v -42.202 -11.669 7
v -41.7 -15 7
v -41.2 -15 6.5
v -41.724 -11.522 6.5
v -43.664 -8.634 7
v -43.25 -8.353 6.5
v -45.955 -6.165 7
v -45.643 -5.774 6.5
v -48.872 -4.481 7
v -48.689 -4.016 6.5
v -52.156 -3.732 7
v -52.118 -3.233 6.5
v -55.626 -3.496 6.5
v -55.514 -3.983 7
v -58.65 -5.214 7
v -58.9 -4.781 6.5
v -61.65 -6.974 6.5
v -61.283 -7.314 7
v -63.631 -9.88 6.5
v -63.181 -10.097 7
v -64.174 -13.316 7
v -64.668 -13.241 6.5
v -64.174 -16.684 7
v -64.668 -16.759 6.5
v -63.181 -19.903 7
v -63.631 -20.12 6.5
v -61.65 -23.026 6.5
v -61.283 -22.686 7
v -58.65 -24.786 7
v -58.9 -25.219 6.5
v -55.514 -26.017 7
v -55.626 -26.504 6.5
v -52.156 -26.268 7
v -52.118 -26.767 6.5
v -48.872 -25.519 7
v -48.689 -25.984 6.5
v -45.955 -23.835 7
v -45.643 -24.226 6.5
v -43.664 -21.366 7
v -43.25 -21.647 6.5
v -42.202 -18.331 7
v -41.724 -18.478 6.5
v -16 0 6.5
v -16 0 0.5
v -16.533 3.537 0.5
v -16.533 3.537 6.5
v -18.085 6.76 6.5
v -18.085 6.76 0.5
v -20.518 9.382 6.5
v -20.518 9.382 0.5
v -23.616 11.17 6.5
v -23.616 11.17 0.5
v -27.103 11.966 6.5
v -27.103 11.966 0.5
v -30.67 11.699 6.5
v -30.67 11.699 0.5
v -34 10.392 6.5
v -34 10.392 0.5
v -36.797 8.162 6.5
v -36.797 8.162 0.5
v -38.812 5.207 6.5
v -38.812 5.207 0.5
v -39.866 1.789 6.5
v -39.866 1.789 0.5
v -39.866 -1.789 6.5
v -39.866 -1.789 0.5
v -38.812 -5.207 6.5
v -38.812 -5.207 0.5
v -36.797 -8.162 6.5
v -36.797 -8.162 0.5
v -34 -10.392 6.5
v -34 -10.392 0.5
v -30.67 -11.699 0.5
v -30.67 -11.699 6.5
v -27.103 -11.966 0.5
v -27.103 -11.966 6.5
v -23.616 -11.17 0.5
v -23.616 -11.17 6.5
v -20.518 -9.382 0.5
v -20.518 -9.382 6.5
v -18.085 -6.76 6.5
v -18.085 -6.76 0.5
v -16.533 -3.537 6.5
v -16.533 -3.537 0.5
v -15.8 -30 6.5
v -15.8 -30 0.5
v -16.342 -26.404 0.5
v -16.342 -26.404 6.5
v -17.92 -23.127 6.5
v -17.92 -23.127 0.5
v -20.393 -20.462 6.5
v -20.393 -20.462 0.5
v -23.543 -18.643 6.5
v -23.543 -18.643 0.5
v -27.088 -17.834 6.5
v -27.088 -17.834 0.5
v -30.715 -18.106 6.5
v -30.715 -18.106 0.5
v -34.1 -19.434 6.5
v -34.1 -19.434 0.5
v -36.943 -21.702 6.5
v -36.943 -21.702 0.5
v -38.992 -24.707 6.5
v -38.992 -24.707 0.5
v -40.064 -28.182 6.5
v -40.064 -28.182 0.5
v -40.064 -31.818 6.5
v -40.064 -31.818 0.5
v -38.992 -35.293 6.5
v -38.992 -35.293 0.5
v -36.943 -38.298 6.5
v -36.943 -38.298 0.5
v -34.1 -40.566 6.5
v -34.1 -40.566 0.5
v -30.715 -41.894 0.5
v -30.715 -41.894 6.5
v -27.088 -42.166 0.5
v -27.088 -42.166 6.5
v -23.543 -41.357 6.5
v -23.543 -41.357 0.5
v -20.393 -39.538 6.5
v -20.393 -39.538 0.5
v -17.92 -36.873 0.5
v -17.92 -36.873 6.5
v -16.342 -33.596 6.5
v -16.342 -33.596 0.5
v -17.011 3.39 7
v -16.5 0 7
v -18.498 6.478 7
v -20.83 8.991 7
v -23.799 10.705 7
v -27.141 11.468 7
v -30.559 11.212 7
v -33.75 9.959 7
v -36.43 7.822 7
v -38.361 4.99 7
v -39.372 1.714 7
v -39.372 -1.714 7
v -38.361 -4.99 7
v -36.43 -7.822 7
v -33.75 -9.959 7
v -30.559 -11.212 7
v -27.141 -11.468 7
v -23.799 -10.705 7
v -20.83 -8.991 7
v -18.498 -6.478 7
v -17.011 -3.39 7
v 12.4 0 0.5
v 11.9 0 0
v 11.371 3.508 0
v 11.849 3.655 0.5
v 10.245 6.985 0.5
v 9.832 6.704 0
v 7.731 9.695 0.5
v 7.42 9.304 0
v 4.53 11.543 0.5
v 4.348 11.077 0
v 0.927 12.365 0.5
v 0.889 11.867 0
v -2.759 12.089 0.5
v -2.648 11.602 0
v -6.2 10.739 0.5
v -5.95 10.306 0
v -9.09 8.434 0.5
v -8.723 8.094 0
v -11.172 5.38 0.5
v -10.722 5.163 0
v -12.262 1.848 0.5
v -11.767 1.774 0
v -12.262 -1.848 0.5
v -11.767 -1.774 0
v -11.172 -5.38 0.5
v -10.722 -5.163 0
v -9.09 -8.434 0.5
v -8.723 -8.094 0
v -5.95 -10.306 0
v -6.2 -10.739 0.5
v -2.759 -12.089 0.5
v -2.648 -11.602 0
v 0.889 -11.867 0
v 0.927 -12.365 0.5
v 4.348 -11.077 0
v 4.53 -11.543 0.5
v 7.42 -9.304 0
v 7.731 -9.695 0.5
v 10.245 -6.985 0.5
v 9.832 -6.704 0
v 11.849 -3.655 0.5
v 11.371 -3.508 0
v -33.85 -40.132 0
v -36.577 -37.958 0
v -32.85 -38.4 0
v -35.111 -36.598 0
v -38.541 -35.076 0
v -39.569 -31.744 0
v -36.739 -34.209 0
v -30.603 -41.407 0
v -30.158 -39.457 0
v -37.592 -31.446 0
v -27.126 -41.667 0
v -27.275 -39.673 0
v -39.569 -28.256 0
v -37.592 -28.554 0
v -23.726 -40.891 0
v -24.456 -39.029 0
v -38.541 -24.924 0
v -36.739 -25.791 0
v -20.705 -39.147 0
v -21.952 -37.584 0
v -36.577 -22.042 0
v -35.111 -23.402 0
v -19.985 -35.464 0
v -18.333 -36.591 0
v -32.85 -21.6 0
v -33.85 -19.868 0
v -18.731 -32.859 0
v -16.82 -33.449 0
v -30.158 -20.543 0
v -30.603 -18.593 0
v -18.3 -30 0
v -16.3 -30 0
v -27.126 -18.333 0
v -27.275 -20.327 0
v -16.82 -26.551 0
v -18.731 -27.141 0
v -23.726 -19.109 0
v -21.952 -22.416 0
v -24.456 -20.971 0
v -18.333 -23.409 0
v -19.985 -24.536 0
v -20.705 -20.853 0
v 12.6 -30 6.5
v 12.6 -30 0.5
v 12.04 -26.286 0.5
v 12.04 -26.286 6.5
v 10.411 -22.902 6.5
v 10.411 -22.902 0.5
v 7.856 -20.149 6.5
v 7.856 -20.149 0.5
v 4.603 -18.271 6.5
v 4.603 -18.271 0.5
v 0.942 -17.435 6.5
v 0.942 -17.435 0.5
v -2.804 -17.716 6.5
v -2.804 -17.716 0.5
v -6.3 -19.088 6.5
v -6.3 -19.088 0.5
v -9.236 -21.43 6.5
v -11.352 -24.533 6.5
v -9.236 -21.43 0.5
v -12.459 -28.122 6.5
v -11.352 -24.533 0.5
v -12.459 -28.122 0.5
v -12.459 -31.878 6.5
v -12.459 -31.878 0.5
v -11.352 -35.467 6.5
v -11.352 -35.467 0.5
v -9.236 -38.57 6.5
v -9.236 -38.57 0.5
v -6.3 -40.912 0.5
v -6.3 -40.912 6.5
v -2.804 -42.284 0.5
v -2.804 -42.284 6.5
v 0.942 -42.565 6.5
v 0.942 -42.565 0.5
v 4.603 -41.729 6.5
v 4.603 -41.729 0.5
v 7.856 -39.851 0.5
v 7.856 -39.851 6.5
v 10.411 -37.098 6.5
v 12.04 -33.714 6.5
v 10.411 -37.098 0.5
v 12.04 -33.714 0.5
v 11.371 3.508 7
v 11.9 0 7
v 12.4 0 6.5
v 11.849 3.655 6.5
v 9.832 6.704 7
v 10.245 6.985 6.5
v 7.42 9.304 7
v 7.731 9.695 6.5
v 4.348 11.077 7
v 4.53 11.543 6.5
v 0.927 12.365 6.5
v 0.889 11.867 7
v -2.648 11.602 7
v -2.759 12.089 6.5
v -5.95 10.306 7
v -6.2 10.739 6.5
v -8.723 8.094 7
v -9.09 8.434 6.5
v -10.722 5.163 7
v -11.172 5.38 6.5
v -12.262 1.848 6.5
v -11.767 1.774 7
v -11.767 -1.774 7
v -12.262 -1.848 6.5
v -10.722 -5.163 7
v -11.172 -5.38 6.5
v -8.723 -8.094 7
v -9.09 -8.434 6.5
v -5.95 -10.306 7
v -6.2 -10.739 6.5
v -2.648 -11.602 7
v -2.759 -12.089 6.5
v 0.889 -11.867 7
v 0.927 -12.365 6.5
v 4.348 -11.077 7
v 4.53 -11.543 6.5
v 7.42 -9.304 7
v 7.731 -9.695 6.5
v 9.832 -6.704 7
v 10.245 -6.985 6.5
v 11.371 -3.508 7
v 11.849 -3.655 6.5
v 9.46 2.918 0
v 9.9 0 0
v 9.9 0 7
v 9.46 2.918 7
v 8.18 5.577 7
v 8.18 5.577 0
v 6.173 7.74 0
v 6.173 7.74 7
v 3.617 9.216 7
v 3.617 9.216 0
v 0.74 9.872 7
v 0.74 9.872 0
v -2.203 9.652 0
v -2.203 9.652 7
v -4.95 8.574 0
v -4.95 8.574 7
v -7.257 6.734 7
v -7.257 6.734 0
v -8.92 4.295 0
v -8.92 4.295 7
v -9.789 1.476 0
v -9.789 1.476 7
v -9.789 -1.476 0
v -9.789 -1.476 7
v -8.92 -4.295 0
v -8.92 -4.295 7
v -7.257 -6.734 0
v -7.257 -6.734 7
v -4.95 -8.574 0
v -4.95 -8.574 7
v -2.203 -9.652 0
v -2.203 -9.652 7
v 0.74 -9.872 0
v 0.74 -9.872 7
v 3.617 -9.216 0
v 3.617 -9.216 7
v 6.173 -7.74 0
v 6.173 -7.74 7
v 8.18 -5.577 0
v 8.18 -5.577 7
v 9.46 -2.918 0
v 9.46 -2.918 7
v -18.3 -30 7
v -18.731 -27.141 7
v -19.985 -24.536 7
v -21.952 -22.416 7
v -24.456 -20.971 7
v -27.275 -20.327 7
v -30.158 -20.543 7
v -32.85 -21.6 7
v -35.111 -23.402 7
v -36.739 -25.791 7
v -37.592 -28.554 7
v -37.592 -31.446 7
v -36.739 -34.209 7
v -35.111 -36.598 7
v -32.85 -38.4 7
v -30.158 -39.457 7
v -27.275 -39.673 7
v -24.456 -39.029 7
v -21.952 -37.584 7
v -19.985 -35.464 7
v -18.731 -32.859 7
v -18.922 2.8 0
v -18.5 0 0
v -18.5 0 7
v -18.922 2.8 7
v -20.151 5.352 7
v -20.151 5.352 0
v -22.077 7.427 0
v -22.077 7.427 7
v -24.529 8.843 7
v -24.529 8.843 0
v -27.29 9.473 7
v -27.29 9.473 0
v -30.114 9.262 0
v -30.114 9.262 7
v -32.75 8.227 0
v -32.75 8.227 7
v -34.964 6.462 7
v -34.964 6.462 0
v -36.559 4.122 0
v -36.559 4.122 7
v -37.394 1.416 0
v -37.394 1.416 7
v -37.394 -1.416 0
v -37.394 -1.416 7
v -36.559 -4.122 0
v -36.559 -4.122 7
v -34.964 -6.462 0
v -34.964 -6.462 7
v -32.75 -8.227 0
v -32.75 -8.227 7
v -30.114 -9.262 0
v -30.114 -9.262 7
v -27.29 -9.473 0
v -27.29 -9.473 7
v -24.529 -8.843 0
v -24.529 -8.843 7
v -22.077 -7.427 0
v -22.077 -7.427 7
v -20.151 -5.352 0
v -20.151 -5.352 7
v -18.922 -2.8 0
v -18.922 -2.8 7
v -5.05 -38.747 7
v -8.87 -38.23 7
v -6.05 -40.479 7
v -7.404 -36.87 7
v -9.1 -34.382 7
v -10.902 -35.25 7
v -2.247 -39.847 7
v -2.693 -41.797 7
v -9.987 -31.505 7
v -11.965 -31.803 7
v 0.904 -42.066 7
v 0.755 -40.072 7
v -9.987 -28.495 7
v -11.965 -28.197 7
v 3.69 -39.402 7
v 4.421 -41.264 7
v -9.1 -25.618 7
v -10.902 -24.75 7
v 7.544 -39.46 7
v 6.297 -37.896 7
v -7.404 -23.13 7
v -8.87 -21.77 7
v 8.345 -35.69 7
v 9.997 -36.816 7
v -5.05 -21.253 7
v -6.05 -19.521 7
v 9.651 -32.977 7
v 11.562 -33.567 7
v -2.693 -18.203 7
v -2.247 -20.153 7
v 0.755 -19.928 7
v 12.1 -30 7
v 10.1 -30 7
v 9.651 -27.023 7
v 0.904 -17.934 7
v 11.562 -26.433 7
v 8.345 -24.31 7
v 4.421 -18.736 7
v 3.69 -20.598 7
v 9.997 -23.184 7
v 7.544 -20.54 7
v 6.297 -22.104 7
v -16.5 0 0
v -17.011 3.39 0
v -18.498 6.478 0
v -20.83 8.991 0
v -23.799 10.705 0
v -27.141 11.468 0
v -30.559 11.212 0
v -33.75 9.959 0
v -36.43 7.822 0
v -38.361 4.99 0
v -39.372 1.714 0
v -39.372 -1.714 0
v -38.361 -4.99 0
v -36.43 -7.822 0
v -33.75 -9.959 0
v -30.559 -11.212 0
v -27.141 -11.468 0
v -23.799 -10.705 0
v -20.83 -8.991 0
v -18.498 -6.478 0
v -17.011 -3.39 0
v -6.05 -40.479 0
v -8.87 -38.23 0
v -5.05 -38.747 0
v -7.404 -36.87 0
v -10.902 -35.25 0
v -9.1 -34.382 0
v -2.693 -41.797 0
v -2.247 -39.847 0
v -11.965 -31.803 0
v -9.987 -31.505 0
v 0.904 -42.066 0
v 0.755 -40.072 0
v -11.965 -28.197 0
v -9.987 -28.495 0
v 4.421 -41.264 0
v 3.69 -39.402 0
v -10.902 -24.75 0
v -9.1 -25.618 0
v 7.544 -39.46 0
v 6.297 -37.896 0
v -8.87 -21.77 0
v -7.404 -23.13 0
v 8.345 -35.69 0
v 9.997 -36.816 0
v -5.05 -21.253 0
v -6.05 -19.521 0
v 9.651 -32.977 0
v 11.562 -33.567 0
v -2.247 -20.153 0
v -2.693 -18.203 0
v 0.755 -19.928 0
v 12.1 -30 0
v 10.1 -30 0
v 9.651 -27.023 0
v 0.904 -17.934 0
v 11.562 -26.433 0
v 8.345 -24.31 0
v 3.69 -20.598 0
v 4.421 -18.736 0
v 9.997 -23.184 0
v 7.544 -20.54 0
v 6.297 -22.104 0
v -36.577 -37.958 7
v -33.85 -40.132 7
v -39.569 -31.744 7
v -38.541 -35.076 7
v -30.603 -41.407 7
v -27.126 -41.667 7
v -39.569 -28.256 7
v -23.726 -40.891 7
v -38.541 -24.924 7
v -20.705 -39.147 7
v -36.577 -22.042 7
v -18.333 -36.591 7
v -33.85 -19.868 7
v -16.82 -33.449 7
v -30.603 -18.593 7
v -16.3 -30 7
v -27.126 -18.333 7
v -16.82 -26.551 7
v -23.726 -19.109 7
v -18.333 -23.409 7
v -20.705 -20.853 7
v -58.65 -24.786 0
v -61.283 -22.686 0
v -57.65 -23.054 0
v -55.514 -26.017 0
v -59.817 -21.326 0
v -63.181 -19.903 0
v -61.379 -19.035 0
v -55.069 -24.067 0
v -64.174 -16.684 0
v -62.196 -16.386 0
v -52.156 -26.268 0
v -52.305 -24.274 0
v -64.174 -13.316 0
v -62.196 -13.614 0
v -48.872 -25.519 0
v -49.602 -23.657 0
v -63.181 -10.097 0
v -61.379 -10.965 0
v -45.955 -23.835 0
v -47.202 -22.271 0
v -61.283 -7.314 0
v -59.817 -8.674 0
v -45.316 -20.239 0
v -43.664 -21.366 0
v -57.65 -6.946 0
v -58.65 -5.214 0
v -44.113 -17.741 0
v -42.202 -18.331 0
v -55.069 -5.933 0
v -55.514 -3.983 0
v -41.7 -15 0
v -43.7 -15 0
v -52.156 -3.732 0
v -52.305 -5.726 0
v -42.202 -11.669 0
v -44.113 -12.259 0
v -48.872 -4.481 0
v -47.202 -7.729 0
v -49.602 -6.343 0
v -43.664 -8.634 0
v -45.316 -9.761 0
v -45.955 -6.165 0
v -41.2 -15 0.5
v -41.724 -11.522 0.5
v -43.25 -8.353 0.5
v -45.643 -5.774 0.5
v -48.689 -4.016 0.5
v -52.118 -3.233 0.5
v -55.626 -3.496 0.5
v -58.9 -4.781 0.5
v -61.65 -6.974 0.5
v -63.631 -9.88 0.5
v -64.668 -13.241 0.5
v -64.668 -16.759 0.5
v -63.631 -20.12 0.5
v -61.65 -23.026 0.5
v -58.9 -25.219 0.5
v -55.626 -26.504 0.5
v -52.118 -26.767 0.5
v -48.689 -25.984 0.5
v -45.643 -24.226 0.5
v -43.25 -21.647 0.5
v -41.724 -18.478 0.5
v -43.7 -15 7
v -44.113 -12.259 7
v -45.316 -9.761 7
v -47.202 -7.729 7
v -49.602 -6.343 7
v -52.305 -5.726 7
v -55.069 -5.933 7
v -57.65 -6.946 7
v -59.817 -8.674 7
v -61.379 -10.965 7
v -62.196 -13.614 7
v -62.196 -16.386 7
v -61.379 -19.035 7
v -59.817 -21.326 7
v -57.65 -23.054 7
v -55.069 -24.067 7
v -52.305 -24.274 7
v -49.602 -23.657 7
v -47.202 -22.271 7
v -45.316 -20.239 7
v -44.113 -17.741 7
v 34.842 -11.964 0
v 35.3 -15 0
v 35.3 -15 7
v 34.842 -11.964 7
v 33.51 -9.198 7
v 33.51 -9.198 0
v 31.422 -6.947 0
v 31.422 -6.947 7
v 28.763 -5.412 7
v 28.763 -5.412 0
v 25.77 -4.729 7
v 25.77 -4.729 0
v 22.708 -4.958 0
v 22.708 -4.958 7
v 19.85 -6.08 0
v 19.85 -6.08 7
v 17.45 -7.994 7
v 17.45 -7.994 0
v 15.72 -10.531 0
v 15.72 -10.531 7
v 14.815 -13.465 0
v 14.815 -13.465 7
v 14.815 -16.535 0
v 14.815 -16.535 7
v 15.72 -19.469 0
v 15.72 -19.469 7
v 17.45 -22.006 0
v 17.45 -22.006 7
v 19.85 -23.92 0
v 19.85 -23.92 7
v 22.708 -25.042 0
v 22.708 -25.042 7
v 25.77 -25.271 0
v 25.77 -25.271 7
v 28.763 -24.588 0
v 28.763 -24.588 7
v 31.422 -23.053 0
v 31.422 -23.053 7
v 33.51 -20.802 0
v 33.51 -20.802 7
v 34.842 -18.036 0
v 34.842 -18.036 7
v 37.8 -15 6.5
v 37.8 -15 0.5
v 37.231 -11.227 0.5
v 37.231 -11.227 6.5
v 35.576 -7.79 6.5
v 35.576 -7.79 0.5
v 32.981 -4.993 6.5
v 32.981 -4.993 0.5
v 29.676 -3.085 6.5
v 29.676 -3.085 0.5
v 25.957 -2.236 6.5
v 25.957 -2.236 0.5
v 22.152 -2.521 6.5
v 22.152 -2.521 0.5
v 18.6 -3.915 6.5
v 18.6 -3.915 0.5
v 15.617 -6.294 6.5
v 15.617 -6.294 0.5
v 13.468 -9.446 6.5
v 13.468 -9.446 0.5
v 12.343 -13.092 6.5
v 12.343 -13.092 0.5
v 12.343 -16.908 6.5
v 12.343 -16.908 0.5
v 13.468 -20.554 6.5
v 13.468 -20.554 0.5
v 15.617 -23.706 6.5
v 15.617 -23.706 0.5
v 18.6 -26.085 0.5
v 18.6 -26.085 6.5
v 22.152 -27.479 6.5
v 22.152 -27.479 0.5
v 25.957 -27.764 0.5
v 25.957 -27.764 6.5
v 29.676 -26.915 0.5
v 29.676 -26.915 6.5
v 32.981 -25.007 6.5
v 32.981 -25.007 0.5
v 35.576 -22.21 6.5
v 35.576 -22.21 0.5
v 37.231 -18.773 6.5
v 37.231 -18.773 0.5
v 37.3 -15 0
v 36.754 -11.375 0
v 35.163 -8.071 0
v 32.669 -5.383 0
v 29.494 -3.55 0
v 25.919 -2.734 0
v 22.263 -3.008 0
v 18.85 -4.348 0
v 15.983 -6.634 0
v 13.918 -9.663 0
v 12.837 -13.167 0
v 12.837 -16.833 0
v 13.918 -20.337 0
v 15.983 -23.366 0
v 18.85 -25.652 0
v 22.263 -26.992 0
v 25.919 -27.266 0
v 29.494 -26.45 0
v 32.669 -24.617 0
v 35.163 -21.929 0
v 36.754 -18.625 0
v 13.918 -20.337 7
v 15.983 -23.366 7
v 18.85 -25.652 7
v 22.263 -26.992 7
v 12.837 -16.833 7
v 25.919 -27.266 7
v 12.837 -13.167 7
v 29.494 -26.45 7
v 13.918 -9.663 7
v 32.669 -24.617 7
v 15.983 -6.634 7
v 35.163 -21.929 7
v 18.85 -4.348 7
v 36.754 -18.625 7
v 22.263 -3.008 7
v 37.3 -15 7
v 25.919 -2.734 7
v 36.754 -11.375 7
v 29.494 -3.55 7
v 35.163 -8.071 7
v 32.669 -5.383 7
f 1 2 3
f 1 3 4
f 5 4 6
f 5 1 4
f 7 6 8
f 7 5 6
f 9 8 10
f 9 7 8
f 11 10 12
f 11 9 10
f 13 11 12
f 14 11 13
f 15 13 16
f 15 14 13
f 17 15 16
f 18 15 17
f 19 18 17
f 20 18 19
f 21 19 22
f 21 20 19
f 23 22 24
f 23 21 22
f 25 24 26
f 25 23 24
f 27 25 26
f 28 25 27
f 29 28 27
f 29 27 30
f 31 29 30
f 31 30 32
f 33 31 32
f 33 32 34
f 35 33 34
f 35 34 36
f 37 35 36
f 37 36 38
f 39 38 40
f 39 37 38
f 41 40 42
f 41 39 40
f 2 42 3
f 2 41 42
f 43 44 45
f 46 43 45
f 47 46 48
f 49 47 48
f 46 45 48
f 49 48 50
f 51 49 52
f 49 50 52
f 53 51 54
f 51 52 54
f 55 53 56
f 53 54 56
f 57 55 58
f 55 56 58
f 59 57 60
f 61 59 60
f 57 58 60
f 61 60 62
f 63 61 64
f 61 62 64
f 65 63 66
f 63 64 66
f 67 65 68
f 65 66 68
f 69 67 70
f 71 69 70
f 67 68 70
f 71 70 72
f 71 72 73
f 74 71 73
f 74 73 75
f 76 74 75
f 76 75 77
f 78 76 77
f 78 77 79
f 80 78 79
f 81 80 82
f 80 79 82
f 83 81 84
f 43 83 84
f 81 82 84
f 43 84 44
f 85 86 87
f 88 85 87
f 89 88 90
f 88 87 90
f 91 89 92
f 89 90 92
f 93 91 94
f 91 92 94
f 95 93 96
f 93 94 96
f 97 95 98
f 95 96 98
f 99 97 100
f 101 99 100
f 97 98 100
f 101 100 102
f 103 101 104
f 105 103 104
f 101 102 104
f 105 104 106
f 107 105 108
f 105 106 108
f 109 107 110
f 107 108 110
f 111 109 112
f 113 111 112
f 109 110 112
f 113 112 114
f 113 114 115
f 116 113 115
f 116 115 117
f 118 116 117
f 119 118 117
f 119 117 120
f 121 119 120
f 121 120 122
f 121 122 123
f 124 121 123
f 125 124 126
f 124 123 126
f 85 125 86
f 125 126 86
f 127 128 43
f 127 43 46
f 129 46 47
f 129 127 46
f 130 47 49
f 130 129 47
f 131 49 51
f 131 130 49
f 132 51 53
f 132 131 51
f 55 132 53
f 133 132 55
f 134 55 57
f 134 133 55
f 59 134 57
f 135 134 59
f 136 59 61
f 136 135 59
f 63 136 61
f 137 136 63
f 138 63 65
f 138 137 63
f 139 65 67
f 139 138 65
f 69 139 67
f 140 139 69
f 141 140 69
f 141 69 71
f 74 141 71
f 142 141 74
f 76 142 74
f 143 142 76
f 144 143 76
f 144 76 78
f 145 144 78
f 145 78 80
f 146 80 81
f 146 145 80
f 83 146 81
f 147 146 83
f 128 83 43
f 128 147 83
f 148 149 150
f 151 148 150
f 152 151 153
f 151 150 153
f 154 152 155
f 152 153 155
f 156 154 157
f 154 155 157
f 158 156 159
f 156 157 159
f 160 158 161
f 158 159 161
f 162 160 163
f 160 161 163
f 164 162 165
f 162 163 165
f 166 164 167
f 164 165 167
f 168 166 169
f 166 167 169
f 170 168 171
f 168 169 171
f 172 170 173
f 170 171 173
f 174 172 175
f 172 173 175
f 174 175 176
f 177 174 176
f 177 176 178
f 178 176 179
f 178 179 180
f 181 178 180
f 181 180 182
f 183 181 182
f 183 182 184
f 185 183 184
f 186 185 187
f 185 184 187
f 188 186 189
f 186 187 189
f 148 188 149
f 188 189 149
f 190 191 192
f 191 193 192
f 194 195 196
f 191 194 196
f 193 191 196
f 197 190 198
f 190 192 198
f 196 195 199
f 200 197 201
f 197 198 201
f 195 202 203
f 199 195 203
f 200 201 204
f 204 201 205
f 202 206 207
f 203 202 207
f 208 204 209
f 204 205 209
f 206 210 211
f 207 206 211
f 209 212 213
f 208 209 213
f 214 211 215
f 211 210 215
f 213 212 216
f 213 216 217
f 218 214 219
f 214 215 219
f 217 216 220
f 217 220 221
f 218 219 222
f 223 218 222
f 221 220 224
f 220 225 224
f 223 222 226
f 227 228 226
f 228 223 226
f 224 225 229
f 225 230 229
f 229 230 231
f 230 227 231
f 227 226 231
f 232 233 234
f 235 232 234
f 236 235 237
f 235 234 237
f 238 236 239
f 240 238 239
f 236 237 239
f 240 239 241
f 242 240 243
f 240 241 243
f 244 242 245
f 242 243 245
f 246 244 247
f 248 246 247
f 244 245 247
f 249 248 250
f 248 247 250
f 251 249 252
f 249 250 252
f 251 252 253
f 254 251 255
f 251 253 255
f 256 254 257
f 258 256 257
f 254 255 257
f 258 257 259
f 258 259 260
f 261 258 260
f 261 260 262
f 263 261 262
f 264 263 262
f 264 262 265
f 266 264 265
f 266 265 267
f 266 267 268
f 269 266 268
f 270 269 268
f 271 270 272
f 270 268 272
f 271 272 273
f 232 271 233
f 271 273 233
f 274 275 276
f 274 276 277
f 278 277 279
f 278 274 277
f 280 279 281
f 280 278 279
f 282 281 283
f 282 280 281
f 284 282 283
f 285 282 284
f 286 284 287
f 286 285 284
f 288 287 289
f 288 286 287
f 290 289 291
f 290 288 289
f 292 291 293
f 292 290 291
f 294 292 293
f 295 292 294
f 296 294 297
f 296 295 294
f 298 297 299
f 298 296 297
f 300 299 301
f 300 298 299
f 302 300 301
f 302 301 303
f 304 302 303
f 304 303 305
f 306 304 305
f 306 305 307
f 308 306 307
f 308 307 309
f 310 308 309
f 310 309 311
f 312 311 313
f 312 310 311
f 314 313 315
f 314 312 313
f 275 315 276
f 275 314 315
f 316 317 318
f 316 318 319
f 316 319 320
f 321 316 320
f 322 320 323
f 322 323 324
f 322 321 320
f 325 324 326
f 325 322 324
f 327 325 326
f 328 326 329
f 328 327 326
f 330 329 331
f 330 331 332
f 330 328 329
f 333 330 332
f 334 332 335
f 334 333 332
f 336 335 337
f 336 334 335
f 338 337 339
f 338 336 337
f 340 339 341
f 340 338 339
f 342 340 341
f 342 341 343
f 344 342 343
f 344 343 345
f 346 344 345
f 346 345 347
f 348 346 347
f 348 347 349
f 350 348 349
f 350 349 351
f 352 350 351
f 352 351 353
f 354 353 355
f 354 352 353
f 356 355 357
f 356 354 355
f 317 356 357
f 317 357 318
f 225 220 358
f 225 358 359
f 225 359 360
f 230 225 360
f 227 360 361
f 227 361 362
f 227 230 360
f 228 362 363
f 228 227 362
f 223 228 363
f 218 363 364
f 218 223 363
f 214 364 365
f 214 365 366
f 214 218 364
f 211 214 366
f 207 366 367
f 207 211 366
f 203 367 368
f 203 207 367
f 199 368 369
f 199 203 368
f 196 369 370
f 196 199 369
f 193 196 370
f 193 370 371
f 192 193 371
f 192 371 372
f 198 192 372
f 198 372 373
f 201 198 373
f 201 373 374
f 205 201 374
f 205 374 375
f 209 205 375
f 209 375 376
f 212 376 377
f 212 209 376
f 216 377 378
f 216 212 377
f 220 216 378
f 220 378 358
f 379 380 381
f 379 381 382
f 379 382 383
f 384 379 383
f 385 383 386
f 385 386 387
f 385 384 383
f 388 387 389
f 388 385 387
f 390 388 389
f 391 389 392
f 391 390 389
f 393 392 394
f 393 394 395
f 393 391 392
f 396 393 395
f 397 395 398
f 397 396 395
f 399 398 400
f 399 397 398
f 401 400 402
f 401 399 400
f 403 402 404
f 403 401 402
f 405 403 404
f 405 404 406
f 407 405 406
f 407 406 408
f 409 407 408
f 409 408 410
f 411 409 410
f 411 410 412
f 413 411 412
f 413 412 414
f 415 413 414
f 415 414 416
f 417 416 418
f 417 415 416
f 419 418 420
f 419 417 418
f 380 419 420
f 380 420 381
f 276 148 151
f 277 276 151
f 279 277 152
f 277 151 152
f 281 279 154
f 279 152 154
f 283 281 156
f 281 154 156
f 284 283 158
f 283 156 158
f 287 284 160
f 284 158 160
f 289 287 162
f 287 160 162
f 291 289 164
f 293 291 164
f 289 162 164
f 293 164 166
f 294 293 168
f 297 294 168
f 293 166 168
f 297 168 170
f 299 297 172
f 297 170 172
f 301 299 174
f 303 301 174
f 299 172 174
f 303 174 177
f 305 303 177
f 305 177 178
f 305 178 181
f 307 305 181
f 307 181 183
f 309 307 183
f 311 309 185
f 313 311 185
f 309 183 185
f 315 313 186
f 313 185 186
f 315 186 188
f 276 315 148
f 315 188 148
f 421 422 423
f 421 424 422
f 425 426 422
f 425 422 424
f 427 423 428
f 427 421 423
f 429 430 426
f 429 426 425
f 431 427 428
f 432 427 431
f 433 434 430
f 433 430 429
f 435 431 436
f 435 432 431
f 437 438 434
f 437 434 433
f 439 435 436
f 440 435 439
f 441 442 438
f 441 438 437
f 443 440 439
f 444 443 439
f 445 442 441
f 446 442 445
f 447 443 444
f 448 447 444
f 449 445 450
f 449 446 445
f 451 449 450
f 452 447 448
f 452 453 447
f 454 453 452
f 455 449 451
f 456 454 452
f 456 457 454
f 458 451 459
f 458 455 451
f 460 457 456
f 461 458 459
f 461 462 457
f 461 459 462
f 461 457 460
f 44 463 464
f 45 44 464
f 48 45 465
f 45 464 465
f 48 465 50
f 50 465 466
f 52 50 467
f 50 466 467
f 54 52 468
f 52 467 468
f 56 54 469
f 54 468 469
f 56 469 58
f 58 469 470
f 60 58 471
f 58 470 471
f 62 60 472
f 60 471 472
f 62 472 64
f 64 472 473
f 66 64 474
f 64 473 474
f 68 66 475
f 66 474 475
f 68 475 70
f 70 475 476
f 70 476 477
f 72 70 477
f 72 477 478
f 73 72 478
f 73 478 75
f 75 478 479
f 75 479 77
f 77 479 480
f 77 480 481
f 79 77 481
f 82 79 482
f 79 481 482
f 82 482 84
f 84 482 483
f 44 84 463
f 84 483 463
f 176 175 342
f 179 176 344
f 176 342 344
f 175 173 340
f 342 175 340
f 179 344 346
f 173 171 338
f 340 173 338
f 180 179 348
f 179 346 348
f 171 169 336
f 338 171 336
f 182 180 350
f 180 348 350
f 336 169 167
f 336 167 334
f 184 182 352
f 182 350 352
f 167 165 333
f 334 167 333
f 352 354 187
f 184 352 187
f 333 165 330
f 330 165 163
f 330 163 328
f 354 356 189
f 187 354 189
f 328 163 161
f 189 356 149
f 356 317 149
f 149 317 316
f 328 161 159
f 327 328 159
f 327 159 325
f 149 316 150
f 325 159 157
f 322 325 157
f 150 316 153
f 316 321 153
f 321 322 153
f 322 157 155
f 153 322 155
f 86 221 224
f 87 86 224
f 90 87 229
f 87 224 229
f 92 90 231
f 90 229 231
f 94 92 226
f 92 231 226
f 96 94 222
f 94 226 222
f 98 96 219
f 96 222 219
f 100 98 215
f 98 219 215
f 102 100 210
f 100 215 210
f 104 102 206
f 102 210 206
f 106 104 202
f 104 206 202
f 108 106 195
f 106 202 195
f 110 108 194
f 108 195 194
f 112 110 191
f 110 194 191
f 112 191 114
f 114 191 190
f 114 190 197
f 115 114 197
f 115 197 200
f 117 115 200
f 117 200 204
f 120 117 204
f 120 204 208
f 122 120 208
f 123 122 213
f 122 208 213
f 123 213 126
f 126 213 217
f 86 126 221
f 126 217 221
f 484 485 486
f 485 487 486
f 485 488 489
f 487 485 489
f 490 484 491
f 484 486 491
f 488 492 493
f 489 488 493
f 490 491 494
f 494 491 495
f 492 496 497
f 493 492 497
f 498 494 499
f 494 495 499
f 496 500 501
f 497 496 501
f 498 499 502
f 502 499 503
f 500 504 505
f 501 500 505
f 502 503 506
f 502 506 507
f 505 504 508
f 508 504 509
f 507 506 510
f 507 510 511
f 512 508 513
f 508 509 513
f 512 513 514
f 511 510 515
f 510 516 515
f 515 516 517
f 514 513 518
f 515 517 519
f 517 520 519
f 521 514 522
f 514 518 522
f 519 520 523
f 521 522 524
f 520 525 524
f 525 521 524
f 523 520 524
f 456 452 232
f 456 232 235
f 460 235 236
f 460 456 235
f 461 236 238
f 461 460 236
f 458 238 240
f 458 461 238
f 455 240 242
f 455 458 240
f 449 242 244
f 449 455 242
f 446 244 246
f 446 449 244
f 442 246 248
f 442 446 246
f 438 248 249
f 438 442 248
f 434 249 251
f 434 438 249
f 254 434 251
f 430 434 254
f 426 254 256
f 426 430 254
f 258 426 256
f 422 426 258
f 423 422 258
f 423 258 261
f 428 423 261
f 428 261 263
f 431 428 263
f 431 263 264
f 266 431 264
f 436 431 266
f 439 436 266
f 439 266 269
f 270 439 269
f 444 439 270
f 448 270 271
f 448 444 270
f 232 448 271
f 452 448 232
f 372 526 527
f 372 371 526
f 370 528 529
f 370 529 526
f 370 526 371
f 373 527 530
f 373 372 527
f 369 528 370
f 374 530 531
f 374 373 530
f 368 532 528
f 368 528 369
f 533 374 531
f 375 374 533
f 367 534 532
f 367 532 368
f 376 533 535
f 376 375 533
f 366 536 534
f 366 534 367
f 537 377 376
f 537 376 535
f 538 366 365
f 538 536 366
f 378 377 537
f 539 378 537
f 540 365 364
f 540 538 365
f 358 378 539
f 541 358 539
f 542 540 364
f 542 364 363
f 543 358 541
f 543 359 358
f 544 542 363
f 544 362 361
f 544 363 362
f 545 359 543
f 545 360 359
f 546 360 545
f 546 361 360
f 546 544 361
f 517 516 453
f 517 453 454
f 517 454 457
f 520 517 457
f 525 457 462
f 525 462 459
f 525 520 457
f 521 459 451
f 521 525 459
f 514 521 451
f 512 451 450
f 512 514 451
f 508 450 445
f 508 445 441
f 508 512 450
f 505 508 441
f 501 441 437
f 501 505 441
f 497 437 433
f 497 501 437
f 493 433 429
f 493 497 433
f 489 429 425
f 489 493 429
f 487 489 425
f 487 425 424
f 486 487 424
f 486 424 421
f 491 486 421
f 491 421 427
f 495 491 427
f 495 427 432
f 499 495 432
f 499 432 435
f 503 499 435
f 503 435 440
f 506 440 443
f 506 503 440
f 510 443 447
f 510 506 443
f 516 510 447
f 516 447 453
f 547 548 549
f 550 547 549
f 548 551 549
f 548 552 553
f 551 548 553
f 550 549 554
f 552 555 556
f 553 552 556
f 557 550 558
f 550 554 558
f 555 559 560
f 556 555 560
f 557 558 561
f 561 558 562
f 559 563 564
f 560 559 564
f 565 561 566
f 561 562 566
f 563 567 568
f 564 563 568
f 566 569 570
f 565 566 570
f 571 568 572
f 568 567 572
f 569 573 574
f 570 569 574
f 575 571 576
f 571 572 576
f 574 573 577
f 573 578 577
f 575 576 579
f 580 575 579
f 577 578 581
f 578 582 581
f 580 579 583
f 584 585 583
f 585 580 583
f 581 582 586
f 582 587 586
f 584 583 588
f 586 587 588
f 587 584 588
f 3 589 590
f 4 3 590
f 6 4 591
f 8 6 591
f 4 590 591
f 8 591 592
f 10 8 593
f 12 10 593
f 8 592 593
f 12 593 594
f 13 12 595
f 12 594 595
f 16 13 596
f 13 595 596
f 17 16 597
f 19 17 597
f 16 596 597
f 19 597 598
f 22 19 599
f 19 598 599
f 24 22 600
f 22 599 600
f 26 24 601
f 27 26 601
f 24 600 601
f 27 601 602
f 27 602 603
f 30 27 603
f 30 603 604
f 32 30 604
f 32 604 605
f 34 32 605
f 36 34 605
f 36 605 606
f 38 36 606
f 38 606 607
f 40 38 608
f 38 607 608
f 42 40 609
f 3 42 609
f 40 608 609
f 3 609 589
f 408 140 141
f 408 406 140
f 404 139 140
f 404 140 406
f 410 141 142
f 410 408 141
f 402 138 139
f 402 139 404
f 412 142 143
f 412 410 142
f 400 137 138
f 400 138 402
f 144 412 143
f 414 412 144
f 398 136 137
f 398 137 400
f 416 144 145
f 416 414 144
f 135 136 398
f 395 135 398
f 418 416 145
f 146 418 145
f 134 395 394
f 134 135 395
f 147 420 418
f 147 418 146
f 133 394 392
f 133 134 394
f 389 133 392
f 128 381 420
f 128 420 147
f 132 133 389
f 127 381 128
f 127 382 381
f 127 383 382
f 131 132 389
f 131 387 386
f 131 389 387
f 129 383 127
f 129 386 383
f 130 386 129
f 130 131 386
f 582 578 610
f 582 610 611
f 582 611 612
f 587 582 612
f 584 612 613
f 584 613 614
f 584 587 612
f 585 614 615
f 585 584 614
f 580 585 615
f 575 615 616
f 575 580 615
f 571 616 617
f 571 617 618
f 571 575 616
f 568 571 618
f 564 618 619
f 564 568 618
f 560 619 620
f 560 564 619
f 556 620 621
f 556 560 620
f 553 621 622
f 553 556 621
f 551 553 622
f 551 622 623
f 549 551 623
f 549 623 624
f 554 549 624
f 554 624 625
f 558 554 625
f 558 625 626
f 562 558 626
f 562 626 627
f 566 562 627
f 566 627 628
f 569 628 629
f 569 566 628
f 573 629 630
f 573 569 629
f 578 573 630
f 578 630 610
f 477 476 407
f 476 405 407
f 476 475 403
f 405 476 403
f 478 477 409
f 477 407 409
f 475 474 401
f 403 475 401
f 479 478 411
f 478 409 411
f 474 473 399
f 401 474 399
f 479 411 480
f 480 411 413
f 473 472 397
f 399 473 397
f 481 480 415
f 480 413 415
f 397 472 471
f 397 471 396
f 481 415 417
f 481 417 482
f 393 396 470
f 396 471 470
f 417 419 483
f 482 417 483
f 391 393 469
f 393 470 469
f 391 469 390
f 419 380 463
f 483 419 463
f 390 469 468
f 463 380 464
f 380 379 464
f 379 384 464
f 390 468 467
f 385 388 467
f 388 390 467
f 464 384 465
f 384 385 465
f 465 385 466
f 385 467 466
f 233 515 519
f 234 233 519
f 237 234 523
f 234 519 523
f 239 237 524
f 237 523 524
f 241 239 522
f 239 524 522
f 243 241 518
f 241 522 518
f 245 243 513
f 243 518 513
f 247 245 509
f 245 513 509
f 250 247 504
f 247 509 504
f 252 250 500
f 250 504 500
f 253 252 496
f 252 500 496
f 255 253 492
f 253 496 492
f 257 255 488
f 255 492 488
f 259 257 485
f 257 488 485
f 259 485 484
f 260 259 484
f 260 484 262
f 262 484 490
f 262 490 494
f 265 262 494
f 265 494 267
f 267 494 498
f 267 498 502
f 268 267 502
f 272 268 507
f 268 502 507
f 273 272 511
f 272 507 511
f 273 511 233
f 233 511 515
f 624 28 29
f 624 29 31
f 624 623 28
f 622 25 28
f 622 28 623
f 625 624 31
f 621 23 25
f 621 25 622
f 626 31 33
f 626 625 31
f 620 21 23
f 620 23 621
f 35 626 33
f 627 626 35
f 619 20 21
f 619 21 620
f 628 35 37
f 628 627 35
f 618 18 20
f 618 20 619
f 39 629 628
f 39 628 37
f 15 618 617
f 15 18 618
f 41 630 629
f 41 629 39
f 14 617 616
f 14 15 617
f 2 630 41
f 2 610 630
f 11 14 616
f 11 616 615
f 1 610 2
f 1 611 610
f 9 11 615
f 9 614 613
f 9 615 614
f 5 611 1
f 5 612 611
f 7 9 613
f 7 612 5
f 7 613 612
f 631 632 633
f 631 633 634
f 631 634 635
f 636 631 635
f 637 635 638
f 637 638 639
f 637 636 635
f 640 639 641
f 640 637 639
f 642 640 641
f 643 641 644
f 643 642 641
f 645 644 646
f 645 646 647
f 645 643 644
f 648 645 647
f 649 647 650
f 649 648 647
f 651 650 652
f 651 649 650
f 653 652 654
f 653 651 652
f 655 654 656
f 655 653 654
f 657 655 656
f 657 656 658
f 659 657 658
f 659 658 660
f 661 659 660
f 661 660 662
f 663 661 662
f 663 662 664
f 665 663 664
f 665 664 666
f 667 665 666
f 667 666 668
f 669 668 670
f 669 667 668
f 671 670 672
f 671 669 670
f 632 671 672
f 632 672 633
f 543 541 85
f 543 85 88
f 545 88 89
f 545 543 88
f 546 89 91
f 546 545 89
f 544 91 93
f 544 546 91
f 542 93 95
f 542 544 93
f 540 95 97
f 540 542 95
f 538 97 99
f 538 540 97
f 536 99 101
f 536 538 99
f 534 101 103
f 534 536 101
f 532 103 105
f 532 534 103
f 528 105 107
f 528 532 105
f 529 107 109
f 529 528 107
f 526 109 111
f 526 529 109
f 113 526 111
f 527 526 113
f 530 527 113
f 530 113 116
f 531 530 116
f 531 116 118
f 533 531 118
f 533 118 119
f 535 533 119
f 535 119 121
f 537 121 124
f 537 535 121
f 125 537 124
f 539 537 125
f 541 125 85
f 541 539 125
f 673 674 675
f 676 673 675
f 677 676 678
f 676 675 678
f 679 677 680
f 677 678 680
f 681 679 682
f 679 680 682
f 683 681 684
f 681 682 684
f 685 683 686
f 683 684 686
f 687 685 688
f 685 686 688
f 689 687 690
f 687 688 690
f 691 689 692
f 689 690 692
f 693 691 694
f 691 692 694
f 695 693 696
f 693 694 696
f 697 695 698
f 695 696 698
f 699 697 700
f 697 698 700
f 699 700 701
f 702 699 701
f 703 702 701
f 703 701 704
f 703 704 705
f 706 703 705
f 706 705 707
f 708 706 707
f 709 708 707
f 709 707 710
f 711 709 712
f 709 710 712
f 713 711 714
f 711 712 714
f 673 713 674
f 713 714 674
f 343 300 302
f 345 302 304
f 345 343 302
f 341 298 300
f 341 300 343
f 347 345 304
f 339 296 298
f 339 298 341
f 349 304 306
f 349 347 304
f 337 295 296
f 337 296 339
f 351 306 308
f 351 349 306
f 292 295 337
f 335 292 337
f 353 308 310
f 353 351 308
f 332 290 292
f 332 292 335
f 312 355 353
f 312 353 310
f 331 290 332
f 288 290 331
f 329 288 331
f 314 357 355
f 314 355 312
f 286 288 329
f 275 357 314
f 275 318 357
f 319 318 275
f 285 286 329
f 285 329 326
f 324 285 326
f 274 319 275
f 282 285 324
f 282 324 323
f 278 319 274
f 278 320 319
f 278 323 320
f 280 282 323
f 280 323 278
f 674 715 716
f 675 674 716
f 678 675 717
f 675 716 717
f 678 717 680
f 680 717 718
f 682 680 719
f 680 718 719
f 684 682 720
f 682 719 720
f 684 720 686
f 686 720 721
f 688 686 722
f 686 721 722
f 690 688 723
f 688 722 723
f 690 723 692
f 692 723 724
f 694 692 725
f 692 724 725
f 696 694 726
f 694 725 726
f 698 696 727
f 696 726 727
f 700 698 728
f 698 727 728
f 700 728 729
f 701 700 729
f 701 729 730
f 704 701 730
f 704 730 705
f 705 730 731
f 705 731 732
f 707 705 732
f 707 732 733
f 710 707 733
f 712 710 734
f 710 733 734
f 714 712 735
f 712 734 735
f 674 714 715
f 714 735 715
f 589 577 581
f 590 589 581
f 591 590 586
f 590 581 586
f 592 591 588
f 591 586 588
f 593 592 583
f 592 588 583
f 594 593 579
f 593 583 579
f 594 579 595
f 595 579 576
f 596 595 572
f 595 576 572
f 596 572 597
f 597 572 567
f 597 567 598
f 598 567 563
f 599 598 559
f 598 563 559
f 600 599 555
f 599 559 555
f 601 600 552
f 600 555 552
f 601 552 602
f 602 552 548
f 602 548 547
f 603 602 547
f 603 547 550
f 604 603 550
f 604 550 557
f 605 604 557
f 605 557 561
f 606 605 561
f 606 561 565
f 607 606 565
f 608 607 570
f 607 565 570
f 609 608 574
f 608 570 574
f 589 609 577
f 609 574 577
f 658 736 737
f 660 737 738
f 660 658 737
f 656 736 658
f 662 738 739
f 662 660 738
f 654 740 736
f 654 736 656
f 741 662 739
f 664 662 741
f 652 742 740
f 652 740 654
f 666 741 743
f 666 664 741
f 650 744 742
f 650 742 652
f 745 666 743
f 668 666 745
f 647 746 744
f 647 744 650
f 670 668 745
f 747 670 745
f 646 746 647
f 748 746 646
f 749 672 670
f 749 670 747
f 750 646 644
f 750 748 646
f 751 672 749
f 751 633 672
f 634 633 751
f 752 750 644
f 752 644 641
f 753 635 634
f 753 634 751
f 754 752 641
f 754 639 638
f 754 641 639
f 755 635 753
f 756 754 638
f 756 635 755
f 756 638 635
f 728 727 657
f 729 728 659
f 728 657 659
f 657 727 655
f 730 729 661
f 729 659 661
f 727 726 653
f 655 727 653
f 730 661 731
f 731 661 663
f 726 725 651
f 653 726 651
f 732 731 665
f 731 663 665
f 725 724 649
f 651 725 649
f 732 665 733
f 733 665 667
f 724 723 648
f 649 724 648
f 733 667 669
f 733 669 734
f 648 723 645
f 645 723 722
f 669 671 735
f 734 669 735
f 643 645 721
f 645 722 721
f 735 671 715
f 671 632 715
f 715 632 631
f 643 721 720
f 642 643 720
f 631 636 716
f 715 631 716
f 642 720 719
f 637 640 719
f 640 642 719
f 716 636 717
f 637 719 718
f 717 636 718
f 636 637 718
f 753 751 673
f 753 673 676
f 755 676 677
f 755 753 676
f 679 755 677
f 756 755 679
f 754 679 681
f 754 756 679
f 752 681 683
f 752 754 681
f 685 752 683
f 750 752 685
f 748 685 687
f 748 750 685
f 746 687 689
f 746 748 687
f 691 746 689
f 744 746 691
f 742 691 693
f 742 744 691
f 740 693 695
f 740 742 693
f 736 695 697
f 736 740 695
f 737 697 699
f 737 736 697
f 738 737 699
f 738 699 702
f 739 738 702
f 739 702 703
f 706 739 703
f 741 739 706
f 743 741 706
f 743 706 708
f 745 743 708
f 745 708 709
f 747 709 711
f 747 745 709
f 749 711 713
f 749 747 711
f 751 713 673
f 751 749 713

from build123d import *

# Parameters (mm, degrees)
F0_R     = 11.8
F0_R_2   = 9.3
F0_R_3   = 12
F0_R_4   = 9.5
F0_R_5   = 12.4
F0_R_6   = 9.9
F0_R_7   = 12.8
F0_R_8   = 10.3
F0_R_9   = 12.6
F0_R_10  = 10.1
F0_R_11  = 12.2
F0_R_12  = 9.7
F1_DEPTH = 7
F2_SIZE  = 0.5


with BuildPart() as f1:
    # F0 (on Top) → F1 (new body)
    with BuildSketch(Plane.XY):
        with Locations((-53, -15)):
            Circle(F0_R)
        with Locations((-53, -15)):
            Circle(F0_R_2, mode=Mode.SUBTRACT)
        with Locations((-28, 0)):
            Circle(F0_R_3)
        with Locations((-28, 0)):
            Circle(F0_R_4, mode=Mode.SUBTRACT)
        Circle(F0_R_5)
        Circle(F0_R_6, mode=Mode.SUBTRACT)
        with Locations((25, -15)):
            Circle(F0_R_7)
        with Locations((25, -15)):
            Circle(F0_R_8, mode=Mode.SUBTRACT)
        with Locations((0, -30)):
            Circle(F0_R_9)
        with Locations((0, -30)):
            Circle(F0_R_10, mode=Mode.SUBTRACT)
        with Locations((-28, -30)):
            Circle(F0_R_11)
        with Locations((-28, -30)):
            Circle(F0_R_12, mode=Mode.SUBTRACT)
    extrude(amount=F1_DEPTH)

    # F2
    f2_edges = [f1.edges().sort_by_distance(p)[0] for p in [
        (-64.8, -15, 7),
        (-64.8, -15, 0),
        (-40, 0, 7),
        (-40, 0, 0),
        (-12.4, 0, 0),
        (-12.4, 0, 7),
        (12.2, -15, 7),
        (12.2, -15, 0),
        (-12.6, -30, 7),
        (-12.6, -30, 0),
        (-40.2, -30, 7),
        (-40.2, -30, 0),
    ]]
    chamfer(f2_edges, length=F2_SIZE)


solid = f1.part
